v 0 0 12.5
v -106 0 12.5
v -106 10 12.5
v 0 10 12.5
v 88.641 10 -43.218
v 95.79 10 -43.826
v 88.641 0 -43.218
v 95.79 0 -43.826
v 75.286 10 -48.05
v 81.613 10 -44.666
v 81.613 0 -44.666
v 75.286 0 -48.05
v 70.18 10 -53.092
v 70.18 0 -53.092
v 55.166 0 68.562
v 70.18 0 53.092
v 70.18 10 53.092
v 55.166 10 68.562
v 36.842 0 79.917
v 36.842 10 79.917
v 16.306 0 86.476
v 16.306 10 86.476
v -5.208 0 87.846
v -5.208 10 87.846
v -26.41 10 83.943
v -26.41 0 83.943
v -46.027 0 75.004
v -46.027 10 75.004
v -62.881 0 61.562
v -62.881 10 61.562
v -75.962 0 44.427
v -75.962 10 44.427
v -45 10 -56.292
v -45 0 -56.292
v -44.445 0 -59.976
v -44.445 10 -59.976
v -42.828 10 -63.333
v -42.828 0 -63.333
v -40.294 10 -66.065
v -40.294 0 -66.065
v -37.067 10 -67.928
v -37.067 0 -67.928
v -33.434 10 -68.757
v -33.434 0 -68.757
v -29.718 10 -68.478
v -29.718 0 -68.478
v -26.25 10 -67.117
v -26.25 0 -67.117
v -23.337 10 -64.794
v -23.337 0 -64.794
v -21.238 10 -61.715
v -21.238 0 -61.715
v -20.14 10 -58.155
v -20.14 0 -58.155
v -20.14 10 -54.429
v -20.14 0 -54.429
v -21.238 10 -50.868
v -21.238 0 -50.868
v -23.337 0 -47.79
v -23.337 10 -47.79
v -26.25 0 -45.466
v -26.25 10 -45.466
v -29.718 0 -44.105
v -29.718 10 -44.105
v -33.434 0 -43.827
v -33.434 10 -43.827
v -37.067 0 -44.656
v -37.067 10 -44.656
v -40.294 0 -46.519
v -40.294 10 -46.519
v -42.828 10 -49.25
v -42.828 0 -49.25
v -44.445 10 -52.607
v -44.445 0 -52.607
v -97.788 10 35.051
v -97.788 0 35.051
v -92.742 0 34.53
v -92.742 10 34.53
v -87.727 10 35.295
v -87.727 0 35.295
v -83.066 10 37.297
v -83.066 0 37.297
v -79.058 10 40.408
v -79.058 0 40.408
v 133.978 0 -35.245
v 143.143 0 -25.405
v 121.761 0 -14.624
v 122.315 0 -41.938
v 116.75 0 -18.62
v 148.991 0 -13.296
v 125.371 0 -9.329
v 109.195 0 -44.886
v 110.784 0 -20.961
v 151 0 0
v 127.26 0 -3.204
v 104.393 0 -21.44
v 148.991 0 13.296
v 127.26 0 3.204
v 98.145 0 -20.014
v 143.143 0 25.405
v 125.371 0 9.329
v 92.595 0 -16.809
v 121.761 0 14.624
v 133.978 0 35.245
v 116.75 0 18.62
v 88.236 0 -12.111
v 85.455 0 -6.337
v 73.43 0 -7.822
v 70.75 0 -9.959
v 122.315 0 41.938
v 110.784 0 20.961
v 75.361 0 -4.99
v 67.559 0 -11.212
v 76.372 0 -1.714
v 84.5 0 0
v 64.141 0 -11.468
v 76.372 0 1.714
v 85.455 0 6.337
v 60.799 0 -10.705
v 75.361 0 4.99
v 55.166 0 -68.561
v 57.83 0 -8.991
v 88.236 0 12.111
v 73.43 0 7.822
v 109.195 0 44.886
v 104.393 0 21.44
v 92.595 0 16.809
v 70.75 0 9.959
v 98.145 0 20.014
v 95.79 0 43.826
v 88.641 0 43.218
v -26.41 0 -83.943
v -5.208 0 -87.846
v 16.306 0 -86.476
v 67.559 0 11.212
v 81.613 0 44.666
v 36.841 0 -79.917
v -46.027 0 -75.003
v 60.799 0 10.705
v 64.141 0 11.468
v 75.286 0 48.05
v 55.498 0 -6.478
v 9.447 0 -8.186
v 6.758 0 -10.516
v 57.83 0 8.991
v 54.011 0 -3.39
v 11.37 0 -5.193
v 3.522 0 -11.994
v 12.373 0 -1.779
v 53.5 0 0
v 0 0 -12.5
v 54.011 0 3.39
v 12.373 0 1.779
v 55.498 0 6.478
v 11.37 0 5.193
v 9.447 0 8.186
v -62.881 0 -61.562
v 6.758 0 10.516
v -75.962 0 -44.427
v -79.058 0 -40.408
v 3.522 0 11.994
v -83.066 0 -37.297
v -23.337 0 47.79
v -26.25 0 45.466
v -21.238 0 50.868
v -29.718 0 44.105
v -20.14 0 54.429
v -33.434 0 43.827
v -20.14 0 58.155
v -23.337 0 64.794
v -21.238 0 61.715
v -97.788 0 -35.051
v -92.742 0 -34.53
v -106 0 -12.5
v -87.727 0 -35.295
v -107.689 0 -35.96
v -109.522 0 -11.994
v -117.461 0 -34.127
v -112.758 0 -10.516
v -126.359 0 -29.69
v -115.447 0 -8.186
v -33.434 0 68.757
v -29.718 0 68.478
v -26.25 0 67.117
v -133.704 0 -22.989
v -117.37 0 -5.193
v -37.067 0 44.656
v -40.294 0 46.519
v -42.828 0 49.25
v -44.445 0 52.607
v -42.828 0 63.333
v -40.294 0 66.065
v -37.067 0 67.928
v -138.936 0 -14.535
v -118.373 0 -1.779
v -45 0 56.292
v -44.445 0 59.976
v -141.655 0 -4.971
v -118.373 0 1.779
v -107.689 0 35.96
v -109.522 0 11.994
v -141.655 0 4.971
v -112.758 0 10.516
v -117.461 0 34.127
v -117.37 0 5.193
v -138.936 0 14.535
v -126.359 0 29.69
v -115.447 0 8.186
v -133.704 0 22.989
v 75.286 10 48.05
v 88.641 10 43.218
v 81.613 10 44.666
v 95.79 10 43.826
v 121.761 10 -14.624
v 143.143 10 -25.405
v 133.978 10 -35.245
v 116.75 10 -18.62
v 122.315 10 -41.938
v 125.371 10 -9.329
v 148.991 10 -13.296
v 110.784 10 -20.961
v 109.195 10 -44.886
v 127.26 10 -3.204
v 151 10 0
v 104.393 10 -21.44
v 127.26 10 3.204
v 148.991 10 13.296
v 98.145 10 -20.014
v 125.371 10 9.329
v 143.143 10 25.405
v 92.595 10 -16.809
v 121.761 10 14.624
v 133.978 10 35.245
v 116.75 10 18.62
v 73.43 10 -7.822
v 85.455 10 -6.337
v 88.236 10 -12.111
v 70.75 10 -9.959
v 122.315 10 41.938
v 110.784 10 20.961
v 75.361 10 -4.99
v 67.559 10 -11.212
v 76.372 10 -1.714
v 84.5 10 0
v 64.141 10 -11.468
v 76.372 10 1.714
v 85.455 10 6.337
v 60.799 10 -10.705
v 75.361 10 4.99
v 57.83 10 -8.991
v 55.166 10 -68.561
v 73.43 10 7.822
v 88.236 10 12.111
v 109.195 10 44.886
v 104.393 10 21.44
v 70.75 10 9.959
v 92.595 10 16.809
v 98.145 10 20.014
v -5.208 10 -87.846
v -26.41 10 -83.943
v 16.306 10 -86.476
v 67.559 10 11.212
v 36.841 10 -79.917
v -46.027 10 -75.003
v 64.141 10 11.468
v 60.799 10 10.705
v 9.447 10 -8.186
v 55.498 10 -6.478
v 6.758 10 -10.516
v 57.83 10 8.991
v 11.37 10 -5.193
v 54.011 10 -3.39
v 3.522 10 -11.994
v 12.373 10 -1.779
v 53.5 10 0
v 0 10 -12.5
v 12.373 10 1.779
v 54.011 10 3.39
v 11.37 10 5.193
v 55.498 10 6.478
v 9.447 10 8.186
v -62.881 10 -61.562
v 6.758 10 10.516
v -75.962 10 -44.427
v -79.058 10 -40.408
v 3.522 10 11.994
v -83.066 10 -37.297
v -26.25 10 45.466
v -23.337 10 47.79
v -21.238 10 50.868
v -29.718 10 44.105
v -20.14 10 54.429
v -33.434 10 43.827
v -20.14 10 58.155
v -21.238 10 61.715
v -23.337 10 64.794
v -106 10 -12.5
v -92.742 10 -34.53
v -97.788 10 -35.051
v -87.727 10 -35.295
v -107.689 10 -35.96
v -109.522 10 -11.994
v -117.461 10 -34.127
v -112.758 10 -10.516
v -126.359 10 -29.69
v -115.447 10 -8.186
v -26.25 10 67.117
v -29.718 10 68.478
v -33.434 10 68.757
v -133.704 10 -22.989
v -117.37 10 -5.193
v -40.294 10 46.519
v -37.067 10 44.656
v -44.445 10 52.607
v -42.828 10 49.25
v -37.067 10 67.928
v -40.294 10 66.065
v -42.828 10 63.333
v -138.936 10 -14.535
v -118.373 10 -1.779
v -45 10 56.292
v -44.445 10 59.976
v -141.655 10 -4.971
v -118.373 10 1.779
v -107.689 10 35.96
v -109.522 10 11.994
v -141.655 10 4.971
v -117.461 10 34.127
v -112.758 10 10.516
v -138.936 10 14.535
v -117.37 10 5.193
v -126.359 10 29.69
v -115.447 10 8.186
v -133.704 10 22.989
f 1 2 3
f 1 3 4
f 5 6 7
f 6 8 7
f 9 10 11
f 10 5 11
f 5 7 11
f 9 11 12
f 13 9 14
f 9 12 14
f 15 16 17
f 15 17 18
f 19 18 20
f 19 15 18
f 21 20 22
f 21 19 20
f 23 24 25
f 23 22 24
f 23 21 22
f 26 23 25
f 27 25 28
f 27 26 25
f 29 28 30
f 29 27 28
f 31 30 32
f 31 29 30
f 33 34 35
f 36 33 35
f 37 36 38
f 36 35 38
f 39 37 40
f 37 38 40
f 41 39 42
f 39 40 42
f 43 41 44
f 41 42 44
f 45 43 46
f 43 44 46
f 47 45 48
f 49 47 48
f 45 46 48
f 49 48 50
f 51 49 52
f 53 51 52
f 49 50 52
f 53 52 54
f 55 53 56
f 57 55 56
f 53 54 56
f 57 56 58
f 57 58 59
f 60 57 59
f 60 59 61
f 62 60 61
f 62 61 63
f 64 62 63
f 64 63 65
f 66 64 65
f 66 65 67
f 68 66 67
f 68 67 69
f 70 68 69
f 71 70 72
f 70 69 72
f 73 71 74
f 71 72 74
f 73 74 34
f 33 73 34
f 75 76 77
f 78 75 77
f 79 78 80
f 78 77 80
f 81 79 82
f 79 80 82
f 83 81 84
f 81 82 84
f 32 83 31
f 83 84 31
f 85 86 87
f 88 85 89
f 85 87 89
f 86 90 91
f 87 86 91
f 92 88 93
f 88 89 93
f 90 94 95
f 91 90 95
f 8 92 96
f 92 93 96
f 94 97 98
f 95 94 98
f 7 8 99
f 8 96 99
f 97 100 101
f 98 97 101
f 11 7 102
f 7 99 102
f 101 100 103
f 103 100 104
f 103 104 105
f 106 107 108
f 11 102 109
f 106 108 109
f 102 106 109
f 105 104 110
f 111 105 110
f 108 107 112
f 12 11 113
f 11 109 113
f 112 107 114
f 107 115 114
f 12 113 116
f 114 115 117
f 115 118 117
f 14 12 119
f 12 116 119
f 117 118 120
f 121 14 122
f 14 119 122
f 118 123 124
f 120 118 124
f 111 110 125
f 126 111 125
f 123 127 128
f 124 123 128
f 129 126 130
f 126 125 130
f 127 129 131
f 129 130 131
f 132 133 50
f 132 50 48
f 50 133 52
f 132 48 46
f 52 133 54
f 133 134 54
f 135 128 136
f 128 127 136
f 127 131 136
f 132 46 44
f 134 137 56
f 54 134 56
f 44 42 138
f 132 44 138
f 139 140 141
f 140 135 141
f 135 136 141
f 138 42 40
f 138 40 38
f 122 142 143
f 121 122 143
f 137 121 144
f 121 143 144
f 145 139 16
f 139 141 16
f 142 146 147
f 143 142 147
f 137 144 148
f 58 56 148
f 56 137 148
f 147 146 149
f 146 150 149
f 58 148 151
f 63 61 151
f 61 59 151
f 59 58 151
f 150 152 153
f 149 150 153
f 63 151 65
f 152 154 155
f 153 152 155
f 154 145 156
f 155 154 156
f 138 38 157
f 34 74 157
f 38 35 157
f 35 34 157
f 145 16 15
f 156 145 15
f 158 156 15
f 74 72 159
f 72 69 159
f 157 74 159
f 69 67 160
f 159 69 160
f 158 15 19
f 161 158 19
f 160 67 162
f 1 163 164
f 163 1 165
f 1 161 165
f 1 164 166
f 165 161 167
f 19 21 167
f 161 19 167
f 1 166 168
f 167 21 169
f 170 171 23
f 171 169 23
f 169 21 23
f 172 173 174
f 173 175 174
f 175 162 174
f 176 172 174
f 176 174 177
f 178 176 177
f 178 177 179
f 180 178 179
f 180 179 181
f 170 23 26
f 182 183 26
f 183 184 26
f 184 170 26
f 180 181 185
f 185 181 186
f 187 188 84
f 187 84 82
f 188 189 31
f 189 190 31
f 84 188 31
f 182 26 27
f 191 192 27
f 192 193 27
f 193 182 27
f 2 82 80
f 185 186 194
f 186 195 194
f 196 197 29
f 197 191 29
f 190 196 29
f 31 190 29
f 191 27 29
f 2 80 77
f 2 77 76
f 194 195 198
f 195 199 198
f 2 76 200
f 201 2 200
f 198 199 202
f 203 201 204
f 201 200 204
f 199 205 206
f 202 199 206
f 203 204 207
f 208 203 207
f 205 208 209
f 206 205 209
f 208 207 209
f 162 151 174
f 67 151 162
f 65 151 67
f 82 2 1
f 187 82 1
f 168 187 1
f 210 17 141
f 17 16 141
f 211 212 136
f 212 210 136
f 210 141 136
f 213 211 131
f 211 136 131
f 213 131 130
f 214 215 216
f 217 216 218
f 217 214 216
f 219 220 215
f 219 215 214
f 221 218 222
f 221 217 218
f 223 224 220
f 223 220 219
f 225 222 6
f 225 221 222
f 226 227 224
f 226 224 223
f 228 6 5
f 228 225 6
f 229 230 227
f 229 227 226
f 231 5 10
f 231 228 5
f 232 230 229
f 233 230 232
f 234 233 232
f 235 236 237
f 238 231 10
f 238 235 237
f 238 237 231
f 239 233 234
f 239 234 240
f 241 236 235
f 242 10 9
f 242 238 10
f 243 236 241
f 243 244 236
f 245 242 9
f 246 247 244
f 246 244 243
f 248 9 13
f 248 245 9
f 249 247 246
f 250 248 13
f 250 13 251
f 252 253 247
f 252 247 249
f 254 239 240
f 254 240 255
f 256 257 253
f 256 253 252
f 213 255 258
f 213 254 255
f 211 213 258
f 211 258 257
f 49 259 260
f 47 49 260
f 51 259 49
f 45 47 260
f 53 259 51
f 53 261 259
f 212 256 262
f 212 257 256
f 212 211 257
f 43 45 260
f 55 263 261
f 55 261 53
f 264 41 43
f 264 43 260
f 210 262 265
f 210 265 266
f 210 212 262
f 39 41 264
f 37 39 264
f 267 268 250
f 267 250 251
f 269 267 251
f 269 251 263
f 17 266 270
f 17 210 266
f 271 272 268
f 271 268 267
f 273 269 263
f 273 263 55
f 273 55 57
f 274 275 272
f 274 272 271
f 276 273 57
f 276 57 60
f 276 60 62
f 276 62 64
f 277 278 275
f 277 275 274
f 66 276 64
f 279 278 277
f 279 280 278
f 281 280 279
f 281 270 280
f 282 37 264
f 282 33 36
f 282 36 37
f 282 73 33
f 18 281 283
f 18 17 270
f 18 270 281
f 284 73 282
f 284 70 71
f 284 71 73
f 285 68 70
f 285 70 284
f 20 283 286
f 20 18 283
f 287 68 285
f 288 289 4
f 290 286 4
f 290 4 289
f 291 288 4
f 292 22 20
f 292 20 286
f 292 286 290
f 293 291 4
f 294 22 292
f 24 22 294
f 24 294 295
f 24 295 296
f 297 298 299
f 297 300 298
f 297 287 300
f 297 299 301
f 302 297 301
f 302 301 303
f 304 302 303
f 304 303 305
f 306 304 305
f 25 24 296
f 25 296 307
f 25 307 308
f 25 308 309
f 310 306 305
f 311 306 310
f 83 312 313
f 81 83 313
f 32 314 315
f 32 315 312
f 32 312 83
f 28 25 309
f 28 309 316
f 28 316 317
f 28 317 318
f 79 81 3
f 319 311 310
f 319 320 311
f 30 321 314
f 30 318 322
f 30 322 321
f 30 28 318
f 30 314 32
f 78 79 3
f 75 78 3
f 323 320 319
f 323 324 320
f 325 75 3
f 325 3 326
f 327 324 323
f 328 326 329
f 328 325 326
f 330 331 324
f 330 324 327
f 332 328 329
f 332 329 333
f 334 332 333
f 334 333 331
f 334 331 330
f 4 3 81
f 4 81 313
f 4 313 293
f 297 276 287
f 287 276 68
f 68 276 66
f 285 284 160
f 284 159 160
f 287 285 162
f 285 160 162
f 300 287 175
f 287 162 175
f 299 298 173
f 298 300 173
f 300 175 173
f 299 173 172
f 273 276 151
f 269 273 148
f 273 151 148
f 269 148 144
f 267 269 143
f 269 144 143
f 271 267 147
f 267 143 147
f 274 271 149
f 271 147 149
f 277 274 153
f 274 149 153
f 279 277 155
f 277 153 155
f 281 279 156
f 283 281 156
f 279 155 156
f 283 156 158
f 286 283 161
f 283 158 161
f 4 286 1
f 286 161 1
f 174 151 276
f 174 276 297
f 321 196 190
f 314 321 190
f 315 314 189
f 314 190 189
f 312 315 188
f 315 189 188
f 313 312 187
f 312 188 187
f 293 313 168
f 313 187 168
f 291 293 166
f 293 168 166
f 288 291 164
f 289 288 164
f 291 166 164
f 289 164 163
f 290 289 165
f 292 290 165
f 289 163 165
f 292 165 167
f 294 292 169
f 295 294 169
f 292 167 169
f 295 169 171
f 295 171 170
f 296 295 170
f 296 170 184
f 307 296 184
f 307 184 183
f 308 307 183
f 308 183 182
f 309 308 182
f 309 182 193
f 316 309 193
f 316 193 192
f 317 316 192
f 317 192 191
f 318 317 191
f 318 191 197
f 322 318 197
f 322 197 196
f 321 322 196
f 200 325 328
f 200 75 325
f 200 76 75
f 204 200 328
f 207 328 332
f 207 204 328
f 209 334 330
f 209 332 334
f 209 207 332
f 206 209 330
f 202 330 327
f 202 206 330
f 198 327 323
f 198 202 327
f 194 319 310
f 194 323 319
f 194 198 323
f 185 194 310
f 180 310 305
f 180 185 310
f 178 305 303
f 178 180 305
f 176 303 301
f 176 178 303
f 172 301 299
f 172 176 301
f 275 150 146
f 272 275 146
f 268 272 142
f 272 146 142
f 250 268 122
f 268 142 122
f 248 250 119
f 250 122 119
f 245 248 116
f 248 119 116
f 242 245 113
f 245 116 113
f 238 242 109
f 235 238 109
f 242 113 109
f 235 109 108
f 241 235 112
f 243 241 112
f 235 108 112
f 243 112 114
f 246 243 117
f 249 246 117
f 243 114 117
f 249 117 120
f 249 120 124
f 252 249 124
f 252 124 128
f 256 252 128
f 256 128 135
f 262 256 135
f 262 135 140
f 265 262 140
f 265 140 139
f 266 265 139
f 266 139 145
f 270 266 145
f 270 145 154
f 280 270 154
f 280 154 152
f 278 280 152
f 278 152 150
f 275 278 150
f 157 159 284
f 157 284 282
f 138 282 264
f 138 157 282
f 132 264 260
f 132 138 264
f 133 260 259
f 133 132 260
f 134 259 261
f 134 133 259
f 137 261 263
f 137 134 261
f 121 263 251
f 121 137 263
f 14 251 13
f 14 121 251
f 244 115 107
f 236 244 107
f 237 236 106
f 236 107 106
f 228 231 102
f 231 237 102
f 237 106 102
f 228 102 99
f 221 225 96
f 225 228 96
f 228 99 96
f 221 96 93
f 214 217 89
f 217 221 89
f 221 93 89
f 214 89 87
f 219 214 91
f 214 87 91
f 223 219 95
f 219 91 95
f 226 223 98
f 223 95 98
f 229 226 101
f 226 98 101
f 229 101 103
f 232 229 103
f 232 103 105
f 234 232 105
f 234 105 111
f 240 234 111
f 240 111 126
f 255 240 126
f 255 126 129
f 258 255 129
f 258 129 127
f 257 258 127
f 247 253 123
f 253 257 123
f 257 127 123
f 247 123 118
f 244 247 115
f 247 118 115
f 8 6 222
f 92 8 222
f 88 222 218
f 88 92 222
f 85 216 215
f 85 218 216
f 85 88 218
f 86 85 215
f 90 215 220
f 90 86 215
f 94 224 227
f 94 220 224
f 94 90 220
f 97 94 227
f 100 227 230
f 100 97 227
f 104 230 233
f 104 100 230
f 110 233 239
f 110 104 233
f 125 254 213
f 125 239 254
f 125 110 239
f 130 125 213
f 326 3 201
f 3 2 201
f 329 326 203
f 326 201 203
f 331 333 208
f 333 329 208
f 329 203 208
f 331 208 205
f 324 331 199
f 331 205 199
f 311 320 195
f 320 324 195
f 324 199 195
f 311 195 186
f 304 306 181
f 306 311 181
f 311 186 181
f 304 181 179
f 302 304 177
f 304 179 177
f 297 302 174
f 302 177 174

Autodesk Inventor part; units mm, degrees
ref_plane "YZ Plane" through (0, 0, 0) normal (1, 0, 0) x (0, 1, 0)
ref_plane "XZ Plane" through (0, 0, 0) normal (0, 1, 0) x (-1, 0, 0)
ref_plane "XY Plane" through (0, 0, 0) normal (0, 0, 1) x (1, 0, 0)
sketch "Sketch1" plane through (0, 0, 0) normal (0, 1, 0) x (-1, 0, 0)
  arc A0 (97.7884, -35.051) -> (97.7884, 35.051) centre (106, 0) ccw
  arc A1 (75.9623, 44.4267) -> (97.7884, 35.051) centre (93.2264, 54.5237) ccw
  arc A2 (97.7884, -35.051) -> (75.9623, -44.4267) centre (93.2264, -54.5237) ccw
  arc A3 (-95.7901, 43.8265) -> (-95.7901, -43.8265) centre (-106, 0) ccw
  arc A4 (-95.7901, 43.8265) -> (-70.1803, 53.0916) centre (-90.1179, 68.1745) ccw
  arc A5 (-70.1803, -53.0916) -> (-95.7901, -43.8265) centre (-90.1179, -68.1745) ccw
  arc A6 (75.9623, 44.4267) -> (-70.1803, 53.0916) centre (0, 0) ccw
  arc A7 (-70.1803, -53.0916) -> (75.9623, -44.4267) centre (0, 0) ccw
  circle A8 centre (0, 0) radius 65
  circle A9 centre (-65, 0) radius 11.5
  circle A10 centre (-106, 0) radius 21.5
  arc A11 (0, 12.5) -> (0, -12.5) centre (0, 0) ccw
  arc A12 (106, -12.5) -> (106, 12.5) centre (106, 0) ccw
  line L0 (106, 12.5) -> (0, 12.5)
  line L1 (0, -12.5) -> (106, -12.5)
  line L2 (0, 0) -> (32.5, -56.2917)
  line L3 (-12.5, 0) -> (-53.5, 0)
  line L4 (0, 0) -> (23.2902, 40.3398)
  line L5 (23.2902, 40.3398) -> (32.5, 56.2917)
  circle A13 centre (32.5, 56.2917) radius 12.5
  circle A14 centre (32.5, -56.2917) radius 12.5
  dimension "d13" = 23
  dimension "d1" = 72
  dimension "d2" = 106
  dimension "d3" = 40
  dimension "d4" = 0
  dimension "d5" = 40
  dimension "d7" = 90
  dimension "d8" = 212
  dimension "d9" = 50
  dimension "d10" = 50
  dimension "d11" = 0
  dimension "d12" = 130
  dimension "d14" = 43
  dimension "d15" = 25
  dimension "d16" = 25
  dimension "d18" = 120
  dimension "d19" = 120
  dimension "d20" = 25
  dimension "d21" = 25
extrude "Extrusion1" add sketch "Sketch1" along normal blind 10 contours A2 A7 A5 A3 A4 A6 A1 A0 | L0 L4 L5 A13 A8 | A8 A14 L2 L1 | L0 A11 L3 A9 A8 A13 L5 L4 | L2 A14 A8 A9 L3 A11 L1
equation "\"d5\" = d3"
equation "\"d10\" = d9"
